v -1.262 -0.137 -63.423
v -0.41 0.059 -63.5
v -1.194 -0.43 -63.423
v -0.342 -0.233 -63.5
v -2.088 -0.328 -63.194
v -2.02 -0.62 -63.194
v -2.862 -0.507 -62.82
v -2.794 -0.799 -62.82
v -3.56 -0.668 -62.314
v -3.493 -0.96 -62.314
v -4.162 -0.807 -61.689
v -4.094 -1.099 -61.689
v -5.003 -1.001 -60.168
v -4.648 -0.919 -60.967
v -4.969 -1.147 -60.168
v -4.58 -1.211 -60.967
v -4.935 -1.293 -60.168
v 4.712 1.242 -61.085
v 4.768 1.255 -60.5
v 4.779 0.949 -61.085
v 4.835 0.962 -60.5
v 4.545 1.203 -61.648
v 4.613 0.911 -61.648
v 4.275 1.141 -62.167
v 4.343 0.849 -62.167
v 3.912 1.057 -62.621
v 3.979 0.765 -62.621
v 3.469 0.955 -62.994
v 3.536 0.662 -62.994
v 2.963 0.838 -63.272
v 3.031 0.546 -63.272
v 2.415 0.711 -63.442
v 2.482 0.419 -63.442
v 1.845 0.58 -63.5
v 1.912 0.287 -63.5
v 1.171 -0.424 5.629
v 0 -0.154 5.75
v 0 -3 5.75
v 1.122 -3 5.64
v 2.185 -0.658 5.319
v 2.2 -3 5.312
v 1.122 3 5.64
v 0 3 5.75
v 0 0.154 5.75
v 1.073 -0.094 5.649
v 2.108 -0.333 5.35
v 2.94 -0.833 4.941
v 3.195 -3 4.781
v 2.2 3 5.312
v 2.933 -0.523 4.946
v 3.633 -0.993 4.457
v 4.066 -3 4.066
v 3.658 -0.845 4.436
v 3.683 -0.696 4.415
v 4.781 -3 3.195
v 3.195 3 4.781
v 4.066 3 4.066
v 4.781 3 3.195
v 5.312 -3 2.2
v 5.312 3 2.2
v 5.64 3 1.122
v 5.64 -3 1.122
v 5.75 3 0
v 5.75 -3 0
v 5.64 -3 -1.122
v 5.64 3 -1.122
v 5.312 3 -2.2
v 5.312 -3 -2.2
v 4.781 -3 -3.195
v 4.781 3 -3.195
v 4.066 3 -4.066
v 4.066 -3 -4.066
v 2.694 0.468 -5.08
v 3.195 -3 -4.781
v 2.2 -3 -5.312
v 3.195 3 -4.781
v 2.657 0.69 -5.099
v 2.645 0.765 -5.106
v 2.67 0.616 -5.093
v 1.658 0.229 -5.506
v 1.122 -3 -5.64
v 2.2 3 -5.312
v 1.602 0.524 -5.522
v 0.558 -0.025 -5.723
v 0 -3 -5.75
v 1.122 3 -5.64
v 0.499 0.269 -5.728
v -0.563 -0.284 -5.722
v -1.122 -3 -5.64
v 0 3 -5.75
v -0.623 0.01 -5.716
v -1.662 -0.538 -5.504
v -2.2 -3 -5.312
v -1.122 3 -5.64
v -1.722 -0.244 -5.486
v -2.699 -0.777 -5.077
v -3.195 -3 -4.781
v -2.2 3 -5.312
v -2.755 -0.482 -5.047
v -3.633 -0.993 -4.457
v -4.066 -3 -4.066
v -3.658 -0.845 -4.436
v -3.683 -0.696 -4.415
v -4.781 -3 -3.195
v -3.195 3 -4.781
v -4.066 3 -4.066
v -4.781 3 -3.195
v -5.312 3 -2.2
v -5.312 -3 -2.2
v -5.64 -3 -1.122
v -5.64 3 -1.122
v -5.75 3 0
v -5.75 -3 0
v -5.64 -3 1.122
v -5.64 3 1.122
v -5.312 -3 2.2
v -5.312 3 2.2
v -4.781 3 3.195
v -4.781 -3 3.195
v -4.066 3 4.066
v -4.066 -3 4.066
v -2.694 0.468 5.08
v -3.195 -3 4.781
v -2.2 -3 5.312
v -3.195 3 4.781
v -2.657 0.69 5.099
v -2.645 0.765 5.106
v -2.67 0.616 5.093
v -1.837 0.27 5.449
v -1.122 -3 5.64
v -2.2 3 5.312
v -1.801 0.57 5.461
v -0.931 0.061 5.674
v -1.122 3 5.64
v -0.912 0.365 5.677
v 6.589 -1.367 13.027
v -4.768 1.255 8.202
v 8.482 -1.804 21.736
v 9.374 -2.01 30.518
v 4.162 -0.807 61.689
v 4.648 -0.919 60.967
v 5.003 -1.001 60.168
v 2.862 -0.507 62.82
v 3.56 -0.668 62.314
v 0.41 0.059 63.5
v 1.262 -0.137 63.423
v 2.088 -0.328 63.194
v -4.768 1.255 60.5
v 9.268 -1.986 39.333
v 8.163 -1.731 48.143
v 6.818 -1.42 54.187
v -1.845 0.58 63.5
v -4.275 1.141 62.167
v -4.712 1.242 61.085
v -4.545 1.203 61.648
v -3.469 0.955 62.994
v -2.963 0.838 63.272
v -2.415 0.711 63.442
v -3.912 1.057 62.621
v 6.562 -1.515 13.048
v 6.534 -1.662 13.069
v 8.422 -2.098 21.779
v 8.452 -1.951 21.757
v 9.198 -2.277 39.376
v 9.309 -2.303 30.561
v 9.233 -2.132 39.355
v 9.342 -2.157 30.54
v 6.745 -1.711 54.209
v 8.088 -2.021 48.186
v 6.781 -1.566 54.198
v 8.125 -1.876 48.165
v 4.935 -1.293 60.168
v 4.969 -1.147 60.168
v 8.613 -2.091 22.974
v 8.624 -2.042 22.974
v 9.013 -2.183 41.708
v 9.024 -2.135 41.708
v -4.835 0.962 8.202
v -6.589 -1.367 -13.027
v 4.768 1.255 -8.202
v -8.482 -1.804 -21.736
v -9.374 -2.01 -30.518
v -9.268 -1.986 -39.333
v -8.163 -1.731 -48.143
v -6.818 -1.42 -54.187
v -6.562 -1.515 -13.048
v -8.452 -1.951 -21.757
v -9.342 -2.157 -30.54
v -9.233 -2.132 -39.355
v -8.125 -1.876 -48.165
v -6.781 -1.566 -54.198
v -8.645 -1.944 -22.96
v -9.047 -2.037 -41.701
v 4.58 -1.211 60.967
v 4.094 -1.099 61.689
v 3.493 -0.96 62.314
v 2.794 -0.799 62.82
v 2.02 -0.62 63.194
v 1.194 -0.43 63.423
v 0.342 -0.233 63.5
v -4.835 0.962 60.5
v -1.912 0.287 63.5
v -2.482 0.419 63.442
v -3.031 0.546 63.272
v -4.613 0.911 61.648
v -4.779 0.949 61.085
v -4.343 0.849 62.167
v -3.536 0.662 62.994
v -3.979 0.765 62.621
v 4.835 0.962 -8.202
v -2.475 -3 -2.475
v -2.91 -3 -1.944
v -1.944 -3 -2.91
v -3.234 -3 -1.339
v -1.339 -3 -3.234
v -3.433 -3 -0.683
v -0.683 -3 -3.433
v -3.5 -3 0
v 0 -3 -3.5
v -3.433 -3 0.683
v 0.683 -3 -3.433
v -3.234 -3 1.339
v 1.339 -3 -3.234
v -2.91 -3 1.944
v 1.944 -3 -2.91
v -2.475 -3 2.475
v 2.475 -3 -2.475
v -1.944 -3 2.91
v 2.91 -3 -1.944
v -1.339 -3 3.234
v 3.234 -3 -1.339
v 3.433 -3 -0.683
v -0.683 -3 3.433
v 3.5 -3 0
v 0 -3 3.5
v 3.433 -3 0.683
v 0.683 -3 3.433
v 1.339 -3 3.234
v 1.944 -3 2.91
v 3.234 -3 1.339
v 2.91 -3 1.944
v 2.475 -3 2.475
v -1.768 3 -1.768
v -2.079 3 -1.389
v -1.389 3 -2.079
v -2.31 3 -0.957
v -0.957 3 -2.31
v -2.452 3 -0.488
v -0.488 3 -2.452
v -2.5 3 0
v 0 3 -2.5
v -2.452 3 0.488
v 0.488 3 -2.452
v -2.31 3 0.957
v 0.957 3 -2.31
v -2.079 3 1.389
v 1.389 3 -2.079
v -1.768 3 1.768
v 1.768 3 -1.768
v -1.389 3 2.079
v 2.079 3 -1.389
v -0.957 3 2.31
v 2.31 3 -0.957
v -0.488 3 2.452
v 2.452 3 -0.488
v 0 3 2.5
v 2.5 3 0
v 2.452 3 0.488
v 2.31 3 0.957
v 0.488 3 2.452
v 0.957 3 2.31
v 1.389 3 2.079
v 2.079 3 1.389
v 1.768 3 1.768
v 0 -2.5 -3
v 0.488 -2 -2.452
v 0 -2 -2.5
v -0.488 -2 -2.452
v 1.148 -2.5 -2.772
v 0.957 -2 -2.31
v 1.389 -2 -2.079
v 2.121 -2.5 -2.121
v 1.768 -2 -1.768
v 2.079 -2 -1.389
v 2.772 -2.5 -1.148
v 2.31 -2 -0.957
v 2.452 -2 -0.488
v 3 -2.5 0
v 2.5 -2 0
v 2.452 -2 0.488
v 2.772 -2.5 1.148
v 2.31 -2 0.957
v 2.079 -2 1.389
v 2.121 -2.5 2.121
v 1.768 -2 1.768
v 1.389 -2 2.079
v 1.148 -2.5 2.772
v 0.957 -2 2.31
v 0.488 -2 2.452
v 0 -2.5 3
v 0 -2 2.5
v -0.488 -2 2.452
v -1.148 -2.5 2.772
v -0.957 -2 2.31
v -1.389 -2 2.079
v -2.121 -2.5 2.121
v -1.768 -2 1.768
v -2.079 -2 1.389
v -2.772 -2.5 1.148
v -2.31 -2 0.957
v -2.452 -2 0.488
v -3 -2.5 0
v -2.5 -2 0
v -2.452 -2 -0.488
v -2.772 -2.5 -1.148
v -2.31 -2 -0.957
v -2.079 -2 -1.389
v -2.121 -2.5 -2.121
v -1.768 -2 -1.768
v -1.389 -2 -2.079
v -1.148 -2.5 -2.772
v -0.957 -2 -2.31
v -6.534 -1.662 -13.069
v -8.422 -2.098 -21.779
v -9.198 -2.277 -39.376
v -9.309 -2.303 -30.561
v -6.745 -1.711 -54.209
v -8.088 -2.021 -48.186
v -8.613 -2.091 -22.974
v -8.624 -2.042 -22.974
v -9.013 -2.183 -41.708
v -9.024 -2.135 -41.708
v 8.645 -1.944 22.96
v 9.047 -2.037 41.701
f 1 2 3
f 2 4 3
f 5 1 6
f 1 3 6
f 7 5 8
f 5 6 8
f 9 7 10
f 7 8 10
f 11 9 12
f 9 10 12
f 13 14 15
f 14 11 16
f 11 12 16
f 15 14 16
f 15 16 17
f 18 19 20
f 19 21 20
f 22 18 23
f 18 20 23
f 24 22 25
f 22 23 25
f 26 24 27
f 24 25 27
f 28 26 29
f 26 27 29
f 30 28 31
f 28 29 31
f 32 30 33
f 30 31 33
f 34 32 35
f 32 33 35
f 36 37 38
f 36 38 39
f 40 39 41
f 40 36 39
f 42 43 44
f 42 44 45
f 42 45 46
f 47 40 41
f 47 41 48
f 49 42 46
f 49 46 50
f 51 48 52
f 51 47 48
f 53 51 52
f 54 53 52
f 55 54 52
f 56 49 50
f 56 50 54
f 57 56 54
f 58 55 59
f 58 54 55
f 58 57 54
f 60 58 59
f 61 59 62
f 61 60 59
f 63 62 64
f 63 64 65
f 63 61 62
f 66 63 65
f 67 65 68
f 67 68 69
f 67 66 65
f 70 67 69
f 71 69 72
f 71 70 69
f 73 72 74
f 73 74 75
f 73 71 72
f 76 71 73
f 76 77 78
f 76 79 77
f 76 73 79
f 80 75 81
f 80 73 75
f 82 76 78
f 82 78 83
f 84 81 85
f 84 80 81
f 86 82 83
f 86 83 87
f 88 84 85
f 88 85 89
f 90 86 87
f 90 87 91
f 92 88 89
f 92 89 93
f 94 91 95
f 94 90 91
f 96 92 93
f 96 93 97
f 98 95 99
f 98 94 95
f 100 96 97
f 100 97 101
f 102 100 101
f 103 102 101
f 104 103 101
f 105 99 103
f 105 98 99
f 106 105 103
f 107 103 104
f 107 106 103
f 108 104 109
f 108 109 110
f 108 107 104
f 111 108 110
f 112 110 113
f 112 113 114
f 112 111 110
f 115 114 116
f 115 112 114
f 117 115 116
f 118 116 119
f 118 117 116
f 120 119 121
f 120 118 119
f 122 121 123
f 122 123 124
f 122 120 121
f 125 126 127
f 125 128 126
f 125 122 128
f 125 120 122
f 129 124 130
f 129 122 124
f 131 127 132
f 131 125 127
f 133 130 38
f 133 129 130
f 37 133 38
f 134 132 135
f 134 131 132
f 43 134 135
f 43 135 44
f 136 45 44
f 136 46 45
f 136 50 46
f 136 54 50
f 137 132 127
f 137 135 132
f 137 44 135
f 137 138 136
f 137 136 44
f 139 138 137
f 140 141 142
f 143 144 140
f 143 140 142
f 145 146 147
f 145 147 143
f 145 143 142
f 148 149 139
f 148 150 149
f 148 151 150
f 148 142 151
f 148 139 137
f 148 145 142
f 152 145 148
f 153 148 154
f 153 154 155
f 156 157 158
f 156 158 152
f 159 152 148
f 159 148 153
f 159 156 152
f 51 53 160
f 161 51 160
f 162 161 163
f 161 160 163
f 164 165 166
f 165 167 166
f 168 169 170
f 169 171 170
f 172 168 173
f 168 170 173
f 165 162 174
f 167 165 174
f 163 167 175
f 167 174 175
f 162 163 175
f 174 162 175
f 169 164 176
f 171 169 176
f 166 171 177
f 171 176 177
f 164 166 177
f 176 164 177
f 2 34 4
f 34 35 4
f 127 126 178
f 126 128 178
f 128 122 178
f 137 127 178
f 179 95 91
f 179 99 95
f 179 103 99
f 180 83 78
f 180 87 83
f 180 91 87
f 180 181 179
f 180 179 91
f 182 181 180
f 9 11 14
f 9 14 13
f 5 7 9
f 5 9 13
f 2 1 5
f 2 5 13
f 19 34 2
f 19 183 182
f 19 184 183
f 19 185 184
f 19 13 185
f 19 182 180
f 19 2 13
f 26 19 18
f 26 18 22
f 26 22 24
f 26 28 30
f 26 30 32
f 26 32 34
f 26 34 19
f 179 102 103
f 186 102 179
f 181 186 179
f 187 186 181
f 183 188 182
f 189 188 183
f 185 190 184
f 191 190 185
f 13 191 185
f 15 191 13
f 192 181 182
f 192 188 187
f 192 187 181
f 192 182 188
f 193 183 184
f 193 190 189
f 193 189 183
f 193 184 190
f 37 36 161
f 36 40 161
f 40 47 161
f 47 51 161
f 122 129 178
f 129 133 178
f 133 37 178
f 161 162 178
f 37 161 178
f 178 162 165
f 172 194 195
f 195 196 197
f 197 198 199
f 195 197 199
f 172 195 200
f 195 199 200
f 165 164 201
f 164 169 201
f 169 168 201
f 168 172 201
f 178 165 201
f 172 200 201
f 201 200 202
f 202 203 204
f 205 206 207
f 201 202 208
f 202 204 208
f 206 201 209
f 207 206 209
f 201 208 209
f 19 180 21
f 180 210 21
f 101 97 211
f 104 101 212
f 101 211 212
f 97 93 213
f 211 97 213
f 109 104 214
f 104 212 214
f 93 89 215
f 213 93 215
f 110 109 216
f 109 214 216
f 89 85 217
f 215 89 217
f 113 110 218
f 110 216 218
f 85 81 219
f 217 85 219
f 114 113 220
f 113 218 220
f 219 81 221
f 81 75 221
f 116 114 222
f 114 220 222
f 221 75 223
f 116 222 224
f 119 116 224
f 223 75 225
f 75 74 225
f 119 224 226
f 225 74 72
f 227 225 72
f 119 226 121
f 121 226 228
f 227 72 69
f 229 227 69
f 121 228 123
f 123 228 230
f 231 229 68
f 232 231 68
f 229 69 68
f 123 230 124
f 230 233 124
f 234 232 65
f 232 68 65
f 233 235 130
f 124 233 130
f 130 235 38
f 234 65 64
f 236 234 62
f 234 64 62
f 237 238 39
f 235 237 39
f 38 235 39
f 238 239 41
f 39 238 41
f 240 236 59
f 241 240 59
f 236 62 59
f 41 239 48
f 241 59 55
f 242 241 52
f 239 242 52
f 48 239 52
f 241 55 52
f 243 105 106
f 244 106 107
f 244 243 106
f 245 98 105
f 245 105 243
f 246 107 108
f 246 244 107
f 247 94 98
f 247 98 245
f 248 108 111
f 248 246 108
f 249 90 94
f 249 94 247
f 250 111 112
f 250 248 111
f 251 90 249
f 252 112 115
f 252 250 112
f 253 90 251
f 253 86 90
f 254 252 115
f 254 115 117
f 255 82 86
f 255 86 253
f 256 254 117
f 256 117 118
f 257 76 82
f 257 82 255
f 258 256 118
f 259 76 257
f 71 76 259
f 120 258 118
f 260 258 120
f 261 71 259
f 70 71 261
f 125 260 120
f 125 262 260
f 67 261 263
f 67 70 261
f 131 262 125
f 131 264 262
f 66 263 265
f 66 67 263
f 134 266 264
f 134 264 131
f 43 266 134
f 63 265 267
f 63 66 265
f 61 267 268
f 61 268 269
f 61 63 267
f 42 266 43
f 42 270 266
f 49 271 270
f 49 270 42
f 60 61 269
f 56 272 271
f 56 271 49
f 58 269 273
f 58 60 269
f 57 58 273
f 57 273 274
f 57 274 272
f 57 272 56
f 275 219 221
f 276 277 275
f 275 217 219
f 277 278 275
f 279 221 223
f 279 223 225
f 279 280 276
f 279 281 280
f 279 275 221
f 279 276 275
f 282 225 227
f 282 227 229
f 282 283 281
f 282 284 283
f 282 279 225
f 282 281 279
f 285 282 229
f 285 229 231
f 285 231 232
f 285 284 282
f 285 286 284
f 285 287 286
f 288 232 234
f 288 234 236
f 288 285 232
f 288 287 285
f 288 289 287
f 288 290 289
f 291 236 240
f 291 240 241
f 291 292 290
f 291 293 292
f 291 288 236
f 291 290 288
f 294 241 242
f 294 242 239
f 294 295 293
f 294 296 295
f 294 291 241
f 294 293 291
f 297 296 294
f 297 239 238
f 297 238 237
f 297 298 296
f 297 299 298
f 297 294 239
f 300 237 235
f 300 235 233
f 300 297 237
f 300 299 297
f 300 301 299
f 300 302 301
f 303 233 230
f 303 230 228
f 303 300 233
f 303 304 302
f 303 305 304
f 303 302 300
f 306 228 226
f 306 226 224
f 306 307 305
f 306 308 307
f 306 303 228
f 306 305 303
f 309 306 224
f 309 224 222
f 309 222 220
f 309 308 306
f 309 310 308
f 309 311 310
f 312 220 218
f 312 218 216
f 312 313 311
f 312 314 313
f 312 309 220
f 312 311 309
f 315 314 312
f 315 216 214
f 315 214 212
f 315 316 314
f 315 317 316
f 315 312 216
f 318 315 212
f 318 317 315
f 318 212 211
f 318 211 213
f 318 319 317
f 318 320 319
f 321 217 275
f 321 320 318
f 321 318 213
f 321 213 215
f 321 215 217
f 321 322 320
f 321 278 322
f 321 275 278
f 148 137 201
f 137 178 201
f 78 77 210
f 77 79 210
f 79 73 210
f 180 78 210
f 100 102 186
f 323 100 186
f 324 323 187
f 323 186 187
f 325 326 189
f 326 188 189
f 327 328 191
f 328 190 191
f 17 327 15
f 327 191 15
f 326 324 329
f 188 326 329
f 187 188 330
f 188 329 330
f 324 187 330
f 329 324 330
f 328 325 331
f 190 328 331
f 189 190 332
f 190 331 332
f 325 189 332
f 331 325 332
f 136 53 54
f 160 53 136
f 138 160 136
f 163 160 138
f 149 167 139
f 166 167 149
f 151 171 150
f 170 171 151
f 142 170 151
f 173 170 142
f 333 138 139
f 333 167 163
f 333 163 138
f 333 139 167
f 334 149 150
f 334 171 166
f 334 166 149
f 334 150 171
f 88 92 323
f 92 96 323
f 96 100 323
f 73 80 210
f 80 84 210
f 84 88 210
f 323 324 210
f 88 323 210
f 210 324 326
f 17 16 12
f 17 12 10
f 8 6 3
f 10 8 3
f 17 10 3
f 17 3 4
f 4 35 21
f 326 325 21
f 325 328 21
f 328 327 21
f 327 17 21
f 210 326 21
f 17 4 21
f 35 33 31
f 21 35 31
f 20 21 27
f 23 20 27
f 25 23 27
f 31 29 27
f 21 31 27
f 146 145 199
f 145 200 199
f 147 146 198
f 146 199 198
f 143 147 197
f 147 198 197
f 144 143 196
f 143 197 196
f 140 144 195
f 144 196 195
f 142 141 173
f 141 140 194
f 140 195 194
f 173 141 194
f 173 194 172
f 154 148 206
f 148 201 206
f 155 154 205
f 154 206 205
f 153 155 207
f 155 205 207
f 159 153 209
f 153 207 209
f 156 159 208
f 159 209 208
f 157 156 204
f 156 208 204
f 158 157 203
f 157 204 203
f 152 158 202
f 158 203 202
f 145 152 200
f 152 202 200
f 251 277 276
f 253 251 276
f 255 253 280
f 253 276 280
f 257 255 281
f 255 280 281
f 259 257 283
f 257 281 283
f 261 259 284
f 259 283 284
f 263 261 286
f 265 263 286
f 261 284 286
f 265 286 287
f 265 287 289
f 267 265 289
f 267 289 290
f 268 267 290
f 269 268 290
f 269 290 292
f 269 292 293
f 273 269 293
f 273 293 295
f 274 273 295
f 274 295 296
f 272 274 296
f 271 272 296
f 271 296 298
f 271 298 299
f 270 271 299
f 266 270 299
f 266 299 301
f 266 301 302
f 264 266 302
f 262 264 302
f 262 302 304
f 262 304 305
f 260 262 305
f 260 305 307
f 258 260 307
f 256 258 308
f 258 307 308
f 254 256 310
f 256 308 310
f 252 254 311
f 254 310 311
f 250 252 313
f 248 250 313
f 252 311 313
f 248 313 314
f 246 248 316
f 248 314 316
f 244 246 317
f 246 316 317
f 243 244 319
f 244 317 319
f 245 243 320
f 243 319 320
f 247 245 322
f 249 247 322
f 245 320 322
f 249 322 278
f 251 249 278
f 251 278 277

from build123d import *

# Parameters (mm, degrees)
SKETCH1_R           = 5.75
BOSS_EXTRUDE1_DEPTH = 3
BOSS_EXTRUDE2_DEPTH = 0.15
CIRPATTERN1_COUNT   = 2
SKETCH5_R           = 2.5
CUT_EXTRUDE1_DEPTH  = 65.479328162
CHAMFER1_SIZE       = 1


with BuildPart() as part:
    # Sketch1 → Boss-Extrude1 (new, symmetric)
    with BuildSketch(Plane(origin=(0, 0, 0), x_dir=(1, 0, 0), z_dir=(0, 1, 0))):
        with Locations(Location((0, 0, 0), (0, 0, 270))):
            Circle(SKETCH1_R)
    extrude(amount=BOSS_EXTRUDE1_DEPTH, both=True)

    # Sketch4 → Boss-Extrude2 (add, symmetric)
    with BuildSketch(Plane(origin=(0, 0, 0), x_dir=(0.9743700647852352, -0.22495105434386534, 0), z_dir=(-0.2249510543438653, -0.9743700647852351, 0))):
        with BuildLine():
            Line((-2.09695858, 4.179050657), (-4.927774709, 8.201975805))
            Line((-4.927774709, 8.201975805), (-4.927774709, 60.5))
            ThreePointArc((-4.927774709, 60.5), (-4.049095053, 62.621320344), (-1.927774709, 63.5))
            Line((-1.927774709, 63.5), (0.385917788, 63.5))
            ThreePointArc((0.385917788, 63.5), (3.272130568, 62.582863675), (5.099523115, 60.167910314))
            add(Edge.make_bspline(
                [(3.648123834, 4.179050657), (11.246463355, 22.537150452), (11.557411768, 41.917565493), (5.099523115, 60.167910314)],
                knots=[0, 0, 0, 0, 0.942591792, 0.942591792, 0.942591792, 0.942591792], degree=3))
            Line((3.648123834, 4.179050657), (-2.09695858, 4.179050657))
        make_face()
    boss_extrude2 = extrude(amount=BOSS_EXTRUDE2_DEPTH, both=True)

    # CirPattern1: Boss-Extrude2 ×2 about axis
    cirpattern1_axis = Axis((0, -3, 0), (0, 1, 0))
    for i in range(1, CIRPATTERN1_COUNT):
        add(boss_extrude2.rotate(cirpattern1_axis, i * 360 / CIRPATTERN1_COUNT))

    # Sketch5 → Cut-Extrude1 (cut, through all)
    with BuildSketch(Plane.XZ.offset(3)):
        with Locations(Location((0, 0, 0), (0, 0, 270))):
            Circle(SKETCH5_R)
    extrude(amount=-CUT_EXTRUDE1_DEPTH, mode=Mode.SUBTRACT)

    # Chamfer1
    chamfer1_edges = [part.edges().sort_by_distance(p)[0] for p in [
        (0, -3, 2.5),
    ]]
    chamfer(chamfer1_edges, length=CHAMFER1_SIZE)


solid = part.part
